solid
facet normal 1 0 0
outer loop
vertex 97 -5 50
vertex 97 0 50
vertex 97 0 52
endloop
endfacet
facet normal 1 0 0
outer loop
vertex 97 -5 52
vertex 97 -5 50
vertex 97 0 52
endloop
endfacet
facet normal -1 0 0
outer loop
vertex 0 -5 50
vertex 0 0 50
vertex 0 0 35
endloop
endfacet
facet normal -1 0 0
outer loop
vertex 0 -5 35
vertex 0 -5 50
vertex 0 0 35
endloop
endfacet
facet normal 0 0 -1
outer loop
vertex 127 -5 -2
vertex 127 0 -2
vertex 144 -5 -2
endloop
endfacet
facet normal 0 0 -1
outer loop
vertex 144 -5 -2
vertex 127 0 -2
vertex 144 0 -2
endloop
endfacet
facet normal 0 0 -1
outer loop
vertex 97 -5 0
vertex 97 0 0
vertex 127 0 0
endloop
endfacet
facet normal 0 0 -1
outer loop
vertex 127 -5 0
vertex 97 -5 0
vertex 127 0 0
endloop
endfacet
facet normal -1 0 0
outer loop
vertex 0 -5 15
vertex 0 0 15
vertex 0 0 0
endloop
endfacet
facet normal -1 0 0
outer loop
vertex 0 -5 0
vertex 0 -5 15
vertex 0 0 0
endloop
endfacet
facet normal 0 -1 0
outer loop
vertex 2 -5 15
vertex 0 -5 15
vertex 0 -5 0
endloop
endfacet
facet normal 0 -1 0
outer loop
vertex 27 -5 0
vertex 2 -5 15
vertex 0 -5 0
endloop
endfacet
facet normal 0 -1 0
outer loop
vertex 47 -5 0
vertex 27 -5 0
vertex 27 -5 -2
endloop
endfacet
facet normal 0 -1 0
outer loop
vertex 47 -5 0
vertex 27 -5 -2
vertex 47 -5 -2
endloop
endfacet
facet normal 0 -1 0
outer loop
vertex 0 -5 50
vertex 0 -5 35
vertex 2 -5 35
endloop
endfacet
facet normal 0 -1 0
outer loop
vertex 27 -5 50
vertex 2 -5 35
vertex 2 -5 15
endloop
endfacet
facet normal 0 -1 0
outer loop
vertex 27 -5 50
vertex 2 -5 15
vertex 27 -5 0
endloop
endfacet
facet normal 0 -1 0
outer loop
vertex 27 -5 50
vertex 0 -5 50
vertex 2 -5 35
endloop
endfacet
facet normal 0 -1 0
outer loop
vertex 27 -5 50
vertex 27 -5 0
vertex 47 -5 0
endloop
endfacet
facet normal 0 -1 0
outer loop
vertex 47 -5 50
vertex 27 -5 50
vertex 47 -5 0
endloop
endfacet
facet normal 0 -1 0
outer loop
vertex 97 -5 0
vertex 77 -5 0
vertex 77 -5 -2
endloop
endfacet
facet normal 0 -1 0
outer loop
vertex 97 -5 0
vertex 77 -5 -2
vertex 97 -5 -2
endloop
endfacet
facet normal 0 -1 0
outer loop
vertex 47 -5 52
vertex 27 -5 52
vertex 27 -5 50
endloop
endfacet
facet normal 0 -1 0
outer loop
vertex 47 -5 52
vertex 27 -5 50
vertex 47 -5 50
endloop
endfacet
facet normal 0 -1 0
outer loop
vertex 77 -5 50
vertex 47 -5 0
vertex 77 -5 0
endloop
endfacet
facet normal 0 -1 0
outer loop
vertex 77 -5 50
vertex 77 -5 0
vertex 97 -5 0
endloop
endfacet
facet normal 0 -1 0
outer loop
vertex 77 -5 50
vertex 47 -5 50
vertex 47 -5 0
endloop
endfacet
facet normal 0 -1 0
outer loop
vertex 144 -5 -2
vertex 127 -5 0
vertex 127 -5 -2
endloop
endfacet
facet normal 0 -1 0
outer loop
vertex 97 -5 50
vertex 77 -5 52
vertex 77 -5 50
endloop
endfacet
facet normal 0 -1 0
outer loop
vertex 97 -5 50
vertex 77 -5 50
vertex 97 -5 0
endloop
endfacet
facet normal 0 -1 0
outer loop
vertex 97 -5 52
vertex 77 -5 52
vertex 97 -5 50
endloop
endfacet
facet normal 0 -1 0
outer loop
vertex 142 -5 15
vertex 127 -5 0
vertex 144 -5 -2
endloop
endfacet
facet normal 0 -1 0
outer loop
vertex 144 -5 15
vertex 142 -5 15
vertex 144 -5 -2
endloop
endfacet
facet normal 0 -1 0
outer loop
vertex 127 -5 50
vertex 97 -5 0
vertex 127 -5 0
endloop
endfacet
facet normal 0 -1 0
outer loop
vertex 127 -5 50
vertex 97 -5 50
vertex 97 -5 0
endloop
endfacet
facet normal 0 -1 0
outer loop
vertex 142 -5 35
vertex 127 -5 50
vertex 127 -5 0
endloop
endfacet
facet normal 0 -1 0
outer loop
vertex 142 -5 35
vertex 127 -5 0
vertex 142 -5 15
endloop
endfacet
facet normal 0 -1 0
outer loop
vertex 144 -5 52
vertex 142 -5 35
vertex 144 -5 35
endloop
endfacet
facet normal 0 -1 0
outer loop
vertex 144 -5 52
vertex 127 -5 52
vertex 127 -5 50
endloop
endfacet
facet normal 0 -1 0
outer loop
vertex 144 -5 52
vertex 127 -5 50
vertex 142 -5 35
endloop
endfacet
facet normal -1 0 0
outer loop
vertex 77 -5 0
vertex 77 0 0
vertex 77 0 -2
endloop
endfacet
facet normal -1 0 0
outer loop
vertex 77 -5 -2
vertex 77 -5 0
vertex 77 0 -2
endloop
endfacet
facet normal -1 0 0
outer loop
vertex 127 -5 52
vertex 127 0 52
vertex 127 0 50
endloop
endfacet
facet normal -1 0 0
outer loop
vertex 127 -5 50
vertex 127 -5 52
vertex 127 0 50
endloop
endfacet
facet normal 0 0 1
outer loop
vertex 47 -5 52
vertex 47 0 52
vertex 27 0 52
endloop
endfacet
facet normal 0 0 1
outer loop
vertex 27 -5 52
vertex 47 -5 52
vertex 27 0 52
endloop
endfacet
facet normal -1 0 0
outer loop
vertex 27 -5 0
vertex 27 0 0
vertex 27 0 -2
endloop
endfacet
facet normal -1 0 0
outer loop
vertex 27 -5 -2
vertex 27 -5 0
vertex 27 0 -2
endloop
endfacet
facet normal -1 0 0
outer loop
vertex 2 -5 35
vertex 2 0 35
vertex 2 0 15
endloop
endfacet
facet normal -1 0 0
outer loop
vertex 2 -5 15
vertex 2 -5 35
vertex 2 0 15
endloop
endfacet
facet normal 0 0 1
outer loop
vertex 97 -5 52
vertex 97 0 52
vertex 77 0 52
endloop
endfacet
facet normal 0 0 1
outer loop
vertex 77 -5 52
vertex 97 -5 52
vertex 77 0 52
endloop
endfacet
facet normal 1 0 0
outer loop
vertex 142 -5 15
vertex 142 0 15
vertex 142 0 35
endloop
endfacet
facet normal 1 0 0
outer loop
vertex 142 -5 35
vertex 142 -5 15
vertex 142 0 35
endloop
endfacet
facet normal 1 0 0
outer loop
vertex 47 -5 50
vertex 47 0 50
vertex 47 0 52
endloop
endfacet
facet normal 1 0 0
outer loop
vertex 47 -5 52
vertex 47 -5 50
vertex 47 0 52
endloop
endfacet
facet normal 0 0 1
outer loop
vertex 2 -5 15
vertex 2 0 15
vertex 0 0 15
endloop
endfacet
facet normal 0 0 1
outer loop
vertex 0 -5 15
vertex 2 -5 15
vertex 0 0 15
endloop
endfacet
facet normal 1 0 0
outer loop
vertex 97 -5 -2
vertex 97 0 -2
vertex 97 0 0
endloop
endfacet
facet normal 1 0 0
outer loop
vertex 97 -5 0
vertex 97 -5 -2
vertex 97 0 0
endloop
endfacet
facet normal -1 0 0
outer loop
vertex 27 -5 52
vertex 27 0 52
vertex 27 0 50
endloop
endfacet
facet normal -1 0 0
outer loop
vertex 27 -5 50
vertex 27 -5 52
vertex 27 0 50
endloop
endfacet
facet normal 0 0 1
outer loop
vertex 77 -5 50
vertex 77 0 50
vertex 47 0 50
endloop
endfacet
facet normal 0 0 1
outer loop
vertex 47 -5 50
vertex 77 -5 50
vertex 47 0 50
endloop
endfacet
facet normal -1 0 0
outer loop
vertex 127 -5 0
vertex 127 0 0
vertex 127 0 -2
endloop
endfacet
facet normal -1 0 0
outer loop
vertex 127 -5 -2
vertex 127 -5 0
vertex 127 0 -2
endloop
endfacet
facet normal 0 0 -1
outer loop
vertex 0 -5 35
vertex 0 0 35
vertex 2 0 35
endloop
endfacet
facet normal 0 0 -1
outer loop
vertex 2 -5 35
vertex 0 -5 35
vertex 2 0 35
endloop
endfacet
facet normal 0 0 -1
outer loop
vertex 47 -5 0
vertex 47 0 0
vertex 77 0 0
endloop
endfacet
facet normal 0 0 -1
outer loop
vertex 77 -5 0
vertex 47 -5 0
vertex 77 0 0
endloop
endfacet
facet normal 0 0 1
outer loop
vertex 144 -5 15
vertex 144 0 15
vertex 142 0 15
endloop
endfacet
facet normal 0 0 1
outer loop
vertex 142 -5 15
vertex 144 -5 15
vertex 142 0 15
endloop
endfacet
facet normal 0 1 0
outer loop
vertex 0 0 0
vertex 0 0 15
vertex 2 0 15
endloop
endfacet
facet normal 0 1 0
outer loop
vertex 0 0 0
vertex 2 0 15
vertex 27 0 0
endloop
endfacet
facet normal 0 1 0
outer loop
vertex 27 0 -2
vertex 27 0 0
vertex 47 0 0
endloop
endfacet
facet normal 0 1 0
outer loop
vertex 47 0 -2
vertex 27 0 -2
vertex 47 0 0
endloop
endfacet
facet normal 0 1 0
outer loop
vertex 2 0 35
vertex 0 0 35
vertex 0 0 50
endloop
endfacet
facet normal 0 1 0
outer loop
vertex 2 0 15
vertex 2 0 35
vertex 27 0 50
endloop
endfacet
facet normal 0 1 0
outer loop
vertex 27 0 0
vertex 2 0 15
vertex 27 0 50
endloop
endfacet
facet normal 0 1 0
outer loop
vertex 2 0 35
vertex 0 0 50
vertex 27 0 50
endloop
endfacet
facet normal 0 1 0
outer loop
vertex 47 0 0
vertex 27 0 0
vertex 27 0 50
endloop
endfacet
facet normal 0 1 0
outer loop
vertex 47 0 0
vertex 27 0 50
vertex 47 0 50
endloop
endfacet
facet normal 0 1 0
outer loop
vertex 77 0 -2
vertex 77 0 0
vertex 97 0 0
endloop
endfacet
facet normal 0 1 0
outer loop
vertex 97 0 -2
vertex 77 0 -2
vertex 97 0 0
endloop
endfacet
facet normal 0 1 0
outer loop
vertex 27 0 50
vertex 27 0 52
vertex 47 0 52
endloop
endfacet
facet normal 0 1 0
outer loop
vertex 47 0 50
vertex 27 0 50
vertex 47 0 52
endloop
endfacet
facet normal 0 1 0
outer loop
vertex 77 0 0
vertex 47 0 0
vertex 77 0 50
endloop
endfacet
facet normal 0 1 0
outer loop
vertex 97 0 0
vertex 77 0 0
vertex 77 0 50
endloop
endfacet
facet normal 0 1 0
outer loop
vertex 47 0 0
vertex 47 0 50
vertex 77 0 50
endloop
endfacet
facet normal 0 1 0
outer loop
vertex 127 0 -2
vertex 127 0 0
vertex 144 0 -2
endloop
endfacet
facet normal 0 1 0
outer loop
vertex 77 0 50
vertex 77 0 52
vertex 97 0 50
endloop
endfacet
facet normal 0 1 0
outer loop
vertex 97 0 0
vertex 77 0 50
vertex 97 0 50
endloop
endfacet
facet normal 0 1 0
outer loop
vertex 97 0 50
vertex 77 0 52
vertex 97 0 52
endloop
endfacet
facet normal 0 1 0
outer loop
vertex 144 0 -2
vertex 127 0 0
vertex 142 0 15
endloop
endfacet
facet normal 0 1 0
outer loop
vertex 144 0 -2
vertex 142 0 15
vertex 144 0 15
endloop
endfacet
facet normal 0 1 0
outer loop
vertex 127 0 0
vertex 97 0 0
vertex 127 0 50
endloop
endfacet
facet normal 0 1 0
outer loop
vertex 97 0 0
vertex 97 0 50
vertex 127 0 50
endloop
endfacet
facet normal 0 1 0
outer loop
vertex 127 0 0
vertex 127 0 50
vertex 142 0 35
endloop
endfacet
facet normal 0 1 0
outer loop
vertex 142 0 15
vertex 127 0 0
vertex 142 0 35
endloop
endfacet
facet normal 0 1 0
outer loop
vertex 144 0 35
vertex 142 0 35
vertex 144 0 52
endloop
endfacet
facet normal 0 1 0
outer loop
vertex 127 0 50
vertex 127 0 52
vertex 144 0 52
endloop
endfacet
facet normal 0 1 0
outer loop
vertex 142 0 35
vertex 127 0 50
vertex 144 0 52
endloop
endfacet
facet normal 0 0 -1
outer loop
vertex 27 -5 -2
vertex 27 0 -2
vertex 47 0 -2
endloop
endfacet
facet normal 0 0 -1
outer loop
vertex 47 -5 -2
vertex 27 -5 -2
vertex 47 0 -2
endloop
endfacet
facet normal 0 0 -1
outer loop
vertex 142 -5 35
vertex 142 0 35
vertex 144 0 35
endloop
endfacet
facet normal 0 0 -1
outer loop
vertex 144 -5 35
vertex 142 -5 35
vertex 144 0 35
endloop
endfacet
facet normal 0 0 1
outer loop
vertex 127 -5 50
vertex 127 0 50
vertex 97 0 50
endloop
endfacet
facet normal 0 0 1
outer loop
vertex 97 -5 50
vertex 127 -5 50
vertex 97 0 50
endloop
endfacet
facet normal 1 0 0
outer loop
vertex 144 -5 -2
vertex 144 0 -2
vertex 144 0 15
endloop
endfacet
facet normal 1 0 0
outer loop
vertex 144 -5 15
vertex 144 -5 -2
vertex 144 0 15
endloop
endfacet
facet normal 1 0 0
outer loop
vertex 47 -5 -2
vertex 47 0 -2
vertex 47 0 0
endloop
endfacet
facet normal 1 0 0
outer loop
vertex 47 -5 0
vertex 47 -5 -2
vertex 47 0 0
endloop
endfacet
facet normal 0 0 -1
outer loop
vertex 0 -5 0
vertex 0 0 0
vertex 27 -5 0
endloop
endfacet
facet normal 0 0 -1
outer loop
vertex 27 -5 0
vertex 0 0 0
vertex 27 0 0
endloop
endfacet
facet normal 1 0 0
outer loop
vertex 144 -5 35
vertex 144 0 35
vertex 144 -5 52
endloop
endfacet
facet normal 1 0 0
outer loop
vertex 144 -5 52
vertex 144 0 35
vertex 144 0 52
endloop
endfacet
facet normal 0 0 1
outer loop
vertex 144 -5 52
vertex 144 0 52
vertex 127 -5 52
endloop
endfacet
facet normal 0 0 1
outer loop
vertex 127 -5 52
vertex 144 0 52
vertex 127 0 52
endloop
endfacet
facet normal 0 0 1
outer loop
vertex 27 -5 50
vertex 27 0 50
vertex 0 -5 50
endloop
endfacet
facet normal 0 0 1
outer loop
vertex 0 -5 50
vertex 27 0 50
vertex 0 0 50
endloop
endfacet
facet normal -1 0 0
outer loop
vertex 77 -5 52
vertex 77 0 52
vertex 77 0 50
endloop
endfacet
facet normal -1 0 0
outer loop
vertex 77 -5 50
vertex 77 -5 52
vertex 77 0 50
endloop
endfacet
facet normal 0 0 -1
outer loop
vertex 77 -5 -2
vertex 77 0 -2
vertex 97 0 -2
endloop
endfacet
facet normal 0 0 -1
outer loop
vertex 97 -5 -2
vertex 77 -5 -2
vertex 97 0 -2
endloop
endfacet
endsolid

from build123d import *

# Parameters (mm, degrees)
F1_DEPTH = 5


with BuildPart() as f1:
    # F0 (on Front) → F1 (new body)
    with BuildSketch(Plane.XZ):
        Polygon((0, 15), (0, 0), (27, 0), (27, -2), (47, -2), (47, 0), (77, 0), (77, -2), (97, -2), (97, 0), (127, 0), (127, -2), (144, -2), (144, 15), (142, 15), (142, 35), (144, 35), (144, 52), (127, 52), (127, 50), (97, 50), (97, 52), (77, 52), (77, 50), (47, 50), (47, 52), (27, 52), (27, 50), (0, 50), (0, 35), (2, 35), (2, 15), align=None)
    extrude(amount=F1_DEPTH)


solid = f1.part
